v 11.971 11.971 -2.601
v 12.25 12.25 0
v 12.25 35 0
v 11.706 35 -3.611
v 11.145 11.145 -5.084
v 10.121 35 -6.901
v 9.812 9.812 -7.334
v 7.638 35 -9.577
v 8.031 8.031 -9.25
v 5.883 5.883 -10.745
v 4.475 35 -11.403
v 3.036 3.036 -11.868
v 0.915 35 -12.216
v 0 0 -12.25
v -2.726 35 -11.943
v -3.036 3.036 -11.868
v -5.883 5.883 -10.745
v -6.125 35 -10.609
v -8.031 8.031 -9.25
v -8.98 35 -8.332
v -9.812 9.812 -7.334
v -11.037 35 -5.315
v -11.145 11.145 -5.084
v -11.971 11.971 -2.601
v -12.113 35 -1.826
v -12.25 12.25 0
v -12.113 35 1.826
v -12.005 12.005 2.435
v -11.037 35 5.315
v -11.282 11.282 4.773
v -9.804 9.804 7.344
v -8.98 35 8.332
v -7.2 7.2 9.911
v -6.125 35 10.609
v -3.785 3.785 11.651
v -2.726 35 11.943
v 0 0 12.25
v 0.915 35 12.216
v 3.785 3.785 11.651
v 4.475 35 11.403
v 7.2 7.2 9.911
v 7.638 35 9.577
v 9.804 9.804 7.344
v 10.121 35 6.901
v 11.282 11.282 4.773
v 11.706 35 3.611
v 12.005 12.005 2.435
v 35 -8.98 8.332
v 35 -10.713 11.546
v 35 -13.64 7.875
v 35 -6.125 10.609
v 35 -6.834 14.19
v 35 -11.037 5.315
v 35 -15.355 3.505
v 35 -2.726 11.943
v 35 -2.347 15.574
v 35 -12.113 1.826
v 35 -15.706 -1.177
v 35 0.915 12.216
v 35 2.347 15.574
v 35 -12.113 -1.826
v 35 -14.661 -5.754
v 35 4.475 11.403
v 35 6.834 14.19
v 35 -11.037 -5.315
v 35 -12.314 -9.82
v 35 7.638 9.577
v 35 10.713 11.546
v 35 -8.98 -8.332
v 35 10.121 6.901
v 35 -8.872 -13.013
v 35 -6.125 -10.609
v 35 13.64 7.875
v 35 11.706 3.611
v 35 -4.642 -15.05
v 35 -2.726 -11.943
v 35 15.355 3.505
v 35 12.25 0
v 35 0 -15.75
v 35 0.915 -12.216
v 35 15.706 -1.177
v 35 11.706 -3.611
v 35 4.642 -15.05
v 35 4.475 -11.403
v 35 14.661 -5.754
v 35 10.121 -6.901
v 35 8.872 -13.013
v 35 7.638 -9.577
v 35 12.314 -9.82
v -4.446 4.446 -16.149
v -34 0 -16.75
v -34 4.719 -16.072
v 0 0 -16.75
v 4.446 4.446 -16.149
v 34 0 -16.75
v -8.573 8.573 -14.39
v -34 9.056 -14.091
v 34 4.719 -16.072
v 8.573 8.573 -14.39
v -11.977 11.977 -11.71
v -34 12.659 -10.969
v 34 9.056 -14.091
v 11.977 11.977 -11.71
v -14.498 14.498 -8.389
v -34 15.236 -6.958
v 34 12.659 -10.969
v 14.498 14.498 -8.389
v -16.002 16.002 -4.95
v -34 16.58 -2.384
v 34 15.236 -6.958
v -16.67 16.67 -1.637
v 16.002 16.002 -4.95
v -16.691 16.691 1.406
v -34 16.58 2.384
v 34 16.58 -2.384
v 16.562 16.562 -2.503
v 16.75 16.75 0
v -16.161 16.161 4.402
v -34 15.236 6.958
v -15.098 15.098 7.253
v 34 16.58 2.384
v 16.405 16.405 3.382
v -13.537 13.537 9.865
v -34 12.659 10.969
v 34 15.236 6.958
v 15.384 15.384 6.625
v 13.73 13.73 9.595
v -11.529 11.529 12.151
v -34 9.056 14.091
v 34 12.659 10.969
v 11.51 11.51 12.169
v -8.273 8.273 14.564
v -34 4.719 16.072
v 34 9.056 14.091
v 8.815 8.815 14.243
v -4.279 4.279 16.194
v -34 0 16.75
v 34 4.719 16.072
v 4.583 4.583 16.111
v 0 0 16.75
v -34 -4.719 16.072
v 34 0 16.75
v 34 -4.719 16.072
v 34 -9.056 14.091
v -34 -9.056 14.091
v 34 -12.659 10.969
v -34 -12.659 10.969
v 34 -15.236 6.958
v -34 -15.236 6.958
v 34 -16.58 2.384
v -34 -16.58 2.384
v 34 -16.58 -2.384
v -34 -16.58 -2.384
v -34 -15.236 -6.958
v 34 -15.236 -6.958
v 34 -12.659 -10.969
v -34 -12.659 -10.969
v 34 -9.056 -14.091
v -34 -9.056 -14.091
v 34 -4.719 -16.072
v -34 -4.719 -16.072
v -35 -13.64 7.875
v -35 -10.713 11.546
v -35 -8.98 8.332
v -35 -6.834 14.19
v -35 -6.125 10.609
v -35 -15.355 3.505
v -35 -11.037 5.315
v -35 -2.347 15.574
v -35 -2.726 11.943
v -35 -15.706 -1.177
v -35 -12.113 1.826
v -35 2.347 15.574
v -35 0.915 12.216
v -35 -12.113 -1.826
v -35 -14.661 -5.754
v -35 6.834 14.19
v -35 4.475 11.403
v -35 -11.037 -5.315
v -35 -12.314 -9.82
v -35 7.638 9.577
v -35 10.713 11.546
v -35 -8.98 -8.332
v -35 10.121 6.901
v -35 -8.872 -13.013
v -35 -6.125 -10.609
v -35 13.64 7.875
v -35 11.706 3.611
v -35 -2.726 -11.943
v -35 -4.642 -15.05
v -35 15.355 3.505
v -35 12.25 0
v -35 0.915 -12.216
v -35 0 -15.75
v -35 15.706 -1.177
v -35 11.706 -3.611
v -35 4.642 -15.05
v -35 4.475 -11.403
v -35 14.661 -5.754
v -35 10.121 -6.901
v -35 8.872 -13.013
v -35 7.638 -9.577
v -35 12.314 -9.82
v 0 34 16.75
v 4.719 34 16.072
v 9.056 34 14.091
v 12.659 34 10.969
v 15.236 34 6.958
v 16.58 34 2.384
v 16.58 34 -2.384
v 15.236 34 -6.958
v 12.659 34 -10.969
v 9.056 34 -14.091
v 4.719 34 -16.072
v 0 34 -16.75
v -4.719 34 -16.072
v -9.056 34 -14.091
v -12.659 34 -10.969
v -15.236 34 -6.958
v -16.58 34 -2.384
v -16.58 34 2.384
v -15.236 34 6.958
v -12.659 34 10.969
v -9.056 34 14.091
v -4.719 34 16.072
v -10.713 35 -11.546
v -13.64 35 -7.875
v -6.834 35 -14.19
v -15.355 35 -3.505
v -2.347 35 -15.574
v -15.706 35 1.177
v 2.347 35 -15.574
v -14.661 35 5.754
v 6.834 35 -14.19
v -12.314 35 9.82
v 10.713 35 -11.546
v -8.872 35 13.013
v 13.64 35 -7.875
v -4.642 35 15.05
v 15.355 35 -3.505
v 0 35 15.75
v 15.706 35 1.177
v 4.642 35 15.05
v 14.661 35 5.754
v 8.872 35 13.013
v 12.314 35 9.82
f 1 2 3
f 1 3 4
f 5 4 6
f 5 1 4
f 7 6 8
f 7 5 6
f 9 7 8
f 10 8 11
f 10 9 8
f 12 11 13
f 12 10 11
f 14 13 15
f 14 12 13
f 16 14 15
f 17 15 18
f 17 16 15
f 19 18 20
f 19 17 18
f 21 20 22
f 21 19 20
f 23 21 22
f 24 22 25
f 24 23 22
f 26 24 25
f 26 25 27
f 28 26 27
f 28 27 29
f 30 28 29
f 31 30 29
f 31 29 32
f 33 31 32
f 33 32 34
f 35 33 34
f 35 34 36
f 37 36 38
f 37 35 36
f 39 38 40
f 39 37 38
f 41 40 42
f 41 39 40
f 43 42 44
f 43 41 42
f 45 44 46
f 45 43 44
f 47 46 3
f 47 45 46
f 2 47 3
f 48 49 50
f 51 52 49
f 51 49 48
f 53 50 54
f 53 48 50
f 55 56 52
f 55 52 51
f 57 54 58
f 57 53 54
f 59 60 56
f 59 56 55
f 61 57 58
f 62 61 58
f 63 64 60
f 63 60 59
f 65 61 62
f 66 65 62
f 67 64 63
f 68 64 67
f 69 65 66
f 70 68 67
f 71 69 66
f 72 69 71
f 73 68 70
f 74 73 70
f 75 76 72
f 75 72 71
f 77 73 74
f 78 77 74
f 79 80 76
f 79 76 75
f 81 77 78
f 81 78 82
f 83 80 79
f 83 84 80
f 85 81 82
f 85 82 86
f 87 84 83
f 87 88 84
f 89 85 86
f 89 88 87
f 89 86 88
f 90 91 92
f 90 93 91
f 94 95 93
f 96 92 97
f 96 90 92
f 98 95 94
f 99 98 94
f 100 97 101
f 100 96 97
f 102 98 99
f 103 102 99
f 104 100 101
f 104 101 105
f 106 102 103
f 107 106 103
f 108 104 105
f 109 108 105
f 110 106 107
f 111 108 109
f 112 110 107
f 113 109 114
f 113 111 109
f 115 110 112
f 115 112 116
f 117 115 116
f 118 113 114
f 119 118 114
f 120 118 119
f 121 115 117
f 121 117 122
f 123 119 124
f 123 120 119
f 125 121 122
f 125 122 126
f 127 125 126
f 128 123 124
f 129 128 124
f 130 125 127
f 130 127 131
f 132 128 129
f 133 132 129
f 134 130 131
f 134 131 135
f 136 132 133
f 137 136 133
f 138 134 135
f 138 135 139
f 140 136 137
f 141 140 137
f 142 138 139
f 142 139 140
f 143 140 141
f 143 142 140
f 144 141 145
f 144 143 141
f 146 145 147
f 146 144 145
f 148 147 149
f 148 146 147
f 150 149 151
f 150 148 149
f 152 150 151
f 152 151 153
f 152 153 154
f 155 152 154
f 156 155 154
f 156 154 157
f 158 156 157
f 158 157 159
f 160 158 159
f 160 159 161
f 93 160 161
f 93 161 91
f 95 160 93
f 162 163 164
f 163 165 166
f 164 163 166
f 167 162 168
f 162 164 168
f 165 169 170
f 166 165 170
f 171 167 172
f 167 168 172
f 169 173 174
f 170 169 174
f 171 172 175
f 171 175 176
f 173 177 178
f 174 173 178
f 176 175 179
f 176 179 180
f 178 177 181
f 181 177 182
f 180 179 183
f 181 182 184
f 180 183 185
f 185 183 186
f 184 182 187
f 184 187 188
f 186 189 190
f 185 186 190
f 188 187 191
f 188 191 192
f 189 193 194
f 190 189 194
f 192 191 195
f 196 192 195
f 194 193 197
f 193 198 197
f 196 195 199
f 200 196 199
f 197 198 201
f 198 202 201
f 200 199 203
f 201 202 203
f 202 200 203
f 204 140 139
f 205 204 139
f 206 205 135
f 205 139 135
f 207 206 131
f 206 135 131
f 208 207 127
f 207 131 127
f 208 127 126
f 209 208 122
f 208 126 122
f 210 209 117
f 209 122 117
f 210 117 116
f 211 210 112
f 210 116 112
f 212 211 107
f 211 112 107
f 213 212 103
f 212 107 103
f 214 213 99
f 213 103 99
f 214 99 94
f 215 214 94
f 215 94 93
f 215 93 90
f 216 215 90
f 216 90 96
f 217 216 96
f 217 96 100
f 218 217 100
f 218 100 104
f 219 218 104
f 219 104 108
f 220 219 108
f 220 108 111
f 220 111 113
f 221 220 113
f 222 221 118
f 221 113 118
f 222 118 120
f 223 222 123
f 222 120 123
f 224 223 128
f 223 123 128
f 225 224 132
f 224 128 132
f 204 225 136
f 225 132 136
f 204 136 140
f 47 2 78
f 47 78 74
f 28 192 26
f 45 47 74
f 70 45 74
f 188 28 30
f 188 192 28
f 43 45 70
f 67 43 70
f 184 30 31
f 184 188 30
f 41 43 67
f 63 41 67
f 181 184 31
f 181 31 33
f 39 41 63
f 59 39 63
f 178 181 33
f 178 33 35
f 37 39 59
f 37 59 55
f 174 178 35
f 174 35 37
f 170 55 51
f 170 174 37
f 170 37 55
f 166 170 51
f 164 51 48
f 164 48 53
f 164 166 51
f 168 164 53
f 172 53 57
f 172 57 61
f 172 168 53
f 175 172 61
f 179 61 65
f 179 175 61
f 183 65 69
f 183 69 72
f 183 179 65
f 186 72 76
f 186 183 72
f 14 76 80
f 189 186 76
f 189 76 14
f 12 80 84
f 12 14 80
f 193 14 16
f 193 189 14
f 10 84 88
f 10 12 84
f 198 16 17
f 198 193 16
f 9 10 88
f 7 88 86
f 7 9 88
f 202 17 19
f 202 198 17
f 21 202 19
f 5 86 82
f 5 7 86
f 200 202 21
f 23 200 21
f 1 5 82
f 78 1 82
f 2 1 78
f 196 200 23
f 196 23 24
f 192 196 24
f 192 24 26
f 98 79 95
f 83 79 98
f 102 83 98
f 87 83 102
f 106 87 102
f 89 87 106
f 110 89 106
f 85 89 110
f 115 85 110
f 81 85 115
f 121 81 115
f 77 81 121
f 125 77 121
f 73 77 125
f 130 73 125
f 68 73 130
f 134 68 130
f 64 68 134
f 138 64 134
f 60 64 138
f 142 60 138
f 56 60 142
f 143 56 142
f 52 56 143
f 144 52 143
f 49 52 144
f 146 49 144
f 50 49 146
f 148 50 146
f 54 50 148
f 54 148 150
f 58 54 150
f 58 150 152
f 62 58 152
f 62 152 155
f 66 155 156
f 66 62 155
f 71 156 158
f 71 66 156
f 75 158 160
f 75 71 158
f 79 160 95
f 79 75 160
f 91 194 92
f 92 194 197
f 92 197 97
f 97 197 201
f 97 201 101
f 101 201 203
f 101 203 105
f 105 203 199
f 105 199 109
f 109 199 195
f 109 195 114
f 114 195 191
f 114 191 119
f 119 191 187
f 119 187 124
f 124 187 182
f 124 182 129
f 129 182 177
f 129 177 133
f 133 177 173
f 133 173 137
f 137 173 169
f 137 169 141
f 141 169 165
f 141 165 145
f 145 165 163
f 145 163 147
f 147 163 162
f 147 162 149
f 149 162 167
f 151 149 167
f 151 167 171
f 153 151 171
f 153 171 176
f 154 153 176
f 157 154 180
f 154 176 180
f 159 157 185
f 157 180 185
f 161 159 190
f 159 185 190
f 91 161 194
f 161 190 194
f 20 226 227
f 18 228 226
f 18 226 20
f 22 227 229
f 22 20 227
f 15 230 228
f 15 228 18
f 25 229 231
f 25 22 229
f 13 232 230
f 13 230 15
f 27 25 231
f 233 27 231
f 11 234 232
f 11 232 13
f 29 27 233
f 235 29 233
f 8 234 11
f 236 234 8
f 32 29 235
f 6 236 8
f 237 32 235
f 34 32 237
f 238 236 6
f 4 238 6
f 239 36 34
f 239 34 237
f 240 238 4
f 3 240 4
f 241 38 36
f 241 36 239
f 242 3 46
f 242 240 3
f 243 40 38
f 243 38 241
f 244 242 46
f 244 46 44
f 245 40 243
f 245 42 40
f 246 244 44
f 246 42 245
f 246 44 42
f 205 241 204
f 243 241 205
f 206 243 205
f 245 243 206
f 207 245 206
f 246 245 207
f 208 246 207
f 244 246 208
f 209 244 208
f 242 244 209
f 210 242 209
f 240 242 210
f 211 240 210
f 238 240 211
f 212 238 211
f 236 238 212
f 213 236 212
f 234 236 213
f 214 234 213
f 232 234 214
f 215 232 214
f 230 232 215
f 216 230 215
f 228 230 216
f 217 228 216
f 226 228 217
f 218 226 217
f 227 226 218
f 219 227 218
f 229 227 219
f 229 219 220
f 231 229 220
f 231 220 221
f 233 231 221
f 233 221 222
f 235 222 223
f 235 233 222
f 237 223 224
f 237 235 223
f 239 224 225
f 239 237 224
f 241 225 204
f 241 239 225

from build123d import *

# Parameters (mm, degrees)
RUNROUTE_R           = 16.75
RUNEXTRUDE_DEPTH     = 35
OUTLETROUTE_R        = 16.75
OUTLETEXTRUDE_DEPTH  = 35
TEESHELL_START       = -35
TEESHELL_OUTLINE_R   = 12.25
TEESHELL_DEPTH       = 70
TEESHELL_START_2     = -1e-07
TEESHELL_2_OUTLINE_R = 12.25
TEESHELL_2_DEPTH     = 35.0000001
TEECHAMFER_SIZE      = 1


with BuildPart() as part:
    # RunRoute → RunExtrude (new body)
    with BuildSketch(Plane(origin=(0, 0, 0), x_dir=(0, 0, -1), z_dir=(1, 0, 0))):
        Circle(RUNROUTE_R)
    runextrude = extrude(amount=RUNEXTRUDE_DEPTH)

    # RunExtrudeMirror: RunExtrude across plane
    add(runextrude.mirror(Plane(origin=(0, 0, 0), x_dir=(0, 0, 1), z_dir=(1, 0, 0))))

    # OutletRoute → OutletExtrude (add)
    with BuildSketch(Plane(origin=(0, 0, 0), x_dir=(1, 0, 0), z_dir=(0, 1, 0))):
        with Locations(Location((0, 0, 0), (0, 0, 270))):
            Circle(OUTLETROUTE_R)
    extrude(amount=OUTLETEXTRUDE_DEPTH)

    # TeeShell: read off the stored shape, not the designer's step
    # TeeShell outline → TeeShell (cut)
    with BuildSketch(Plane.YZ.offset(TEESHELL_START)):
        Circle(TEESHELL_OUTLINE_R)
    extrude(amount=TEESHELL_DEPTH, mode=Mode.SUBTRACT)

    # TeeShell 2 outline → TeeShell 2 (cut)
    with BuildSketch(Plane(origin=(0, 0, 0), x_dir=(1, 0, 0), z_dir=(0, 1, 0)).offset(TEESHELL_START_2)):
        Circle(TEESHELL_2_OUTLINE_R)
    extrude(amount=TEESHELL_2_DEPTH, mode=Mode.SUBTRACT)

    # TeeChamfer
    # the kernel refuses this chamfer: 1 mm, written as the material it takes off along each edge
    with BuildSketch(Plane(origin=(0, 35, 0), x_dir=(0, 0, 1), z_dir=(-1, 0, 0))) as teechamfer_piece_1:
        Polygon((16.75, -TEECHAMFER_SIZE), (16.75 - TEECHAMFER_SIZE, 0), (16.75, 0), align=None)
    revolve(axis=Axis((0, 35, 0), (0, 1, 0)), mode=Mode.SUBTRACT)
    with BuildSketch(Plane(origin=(35, 0, 0), x_dir=(0, 0, -1), z_dir=(0, -1, 0))) as teechamfer_piece_2:
        Polygon((16.75, -TEECHAMFER_SIZE), (16.75 - TEECHAMFER_SIZE, 0), (16.75, 0), align=None)
    revolve(axis=Axis((35, 0, 0), (1, 0, 0)), mode=Mode.SUBTRACT)
    with BuildSketch(Plane(origin=(-35, 0, 0), x_dir=(0, 0, -1), z_dir=(0, -1, 0))) as teechamfer_piece_3:
        Polygon((16.75, TEECHAMFER_SIZE), (16.75 - TEECHAMFER_SIZE, 0), (16.75, 0), align=None)
    revolve(axis=Axis((-35, 0, 0), (1, 0, 0)), mode=Mode.SUBTRACT)


solid = part.part
